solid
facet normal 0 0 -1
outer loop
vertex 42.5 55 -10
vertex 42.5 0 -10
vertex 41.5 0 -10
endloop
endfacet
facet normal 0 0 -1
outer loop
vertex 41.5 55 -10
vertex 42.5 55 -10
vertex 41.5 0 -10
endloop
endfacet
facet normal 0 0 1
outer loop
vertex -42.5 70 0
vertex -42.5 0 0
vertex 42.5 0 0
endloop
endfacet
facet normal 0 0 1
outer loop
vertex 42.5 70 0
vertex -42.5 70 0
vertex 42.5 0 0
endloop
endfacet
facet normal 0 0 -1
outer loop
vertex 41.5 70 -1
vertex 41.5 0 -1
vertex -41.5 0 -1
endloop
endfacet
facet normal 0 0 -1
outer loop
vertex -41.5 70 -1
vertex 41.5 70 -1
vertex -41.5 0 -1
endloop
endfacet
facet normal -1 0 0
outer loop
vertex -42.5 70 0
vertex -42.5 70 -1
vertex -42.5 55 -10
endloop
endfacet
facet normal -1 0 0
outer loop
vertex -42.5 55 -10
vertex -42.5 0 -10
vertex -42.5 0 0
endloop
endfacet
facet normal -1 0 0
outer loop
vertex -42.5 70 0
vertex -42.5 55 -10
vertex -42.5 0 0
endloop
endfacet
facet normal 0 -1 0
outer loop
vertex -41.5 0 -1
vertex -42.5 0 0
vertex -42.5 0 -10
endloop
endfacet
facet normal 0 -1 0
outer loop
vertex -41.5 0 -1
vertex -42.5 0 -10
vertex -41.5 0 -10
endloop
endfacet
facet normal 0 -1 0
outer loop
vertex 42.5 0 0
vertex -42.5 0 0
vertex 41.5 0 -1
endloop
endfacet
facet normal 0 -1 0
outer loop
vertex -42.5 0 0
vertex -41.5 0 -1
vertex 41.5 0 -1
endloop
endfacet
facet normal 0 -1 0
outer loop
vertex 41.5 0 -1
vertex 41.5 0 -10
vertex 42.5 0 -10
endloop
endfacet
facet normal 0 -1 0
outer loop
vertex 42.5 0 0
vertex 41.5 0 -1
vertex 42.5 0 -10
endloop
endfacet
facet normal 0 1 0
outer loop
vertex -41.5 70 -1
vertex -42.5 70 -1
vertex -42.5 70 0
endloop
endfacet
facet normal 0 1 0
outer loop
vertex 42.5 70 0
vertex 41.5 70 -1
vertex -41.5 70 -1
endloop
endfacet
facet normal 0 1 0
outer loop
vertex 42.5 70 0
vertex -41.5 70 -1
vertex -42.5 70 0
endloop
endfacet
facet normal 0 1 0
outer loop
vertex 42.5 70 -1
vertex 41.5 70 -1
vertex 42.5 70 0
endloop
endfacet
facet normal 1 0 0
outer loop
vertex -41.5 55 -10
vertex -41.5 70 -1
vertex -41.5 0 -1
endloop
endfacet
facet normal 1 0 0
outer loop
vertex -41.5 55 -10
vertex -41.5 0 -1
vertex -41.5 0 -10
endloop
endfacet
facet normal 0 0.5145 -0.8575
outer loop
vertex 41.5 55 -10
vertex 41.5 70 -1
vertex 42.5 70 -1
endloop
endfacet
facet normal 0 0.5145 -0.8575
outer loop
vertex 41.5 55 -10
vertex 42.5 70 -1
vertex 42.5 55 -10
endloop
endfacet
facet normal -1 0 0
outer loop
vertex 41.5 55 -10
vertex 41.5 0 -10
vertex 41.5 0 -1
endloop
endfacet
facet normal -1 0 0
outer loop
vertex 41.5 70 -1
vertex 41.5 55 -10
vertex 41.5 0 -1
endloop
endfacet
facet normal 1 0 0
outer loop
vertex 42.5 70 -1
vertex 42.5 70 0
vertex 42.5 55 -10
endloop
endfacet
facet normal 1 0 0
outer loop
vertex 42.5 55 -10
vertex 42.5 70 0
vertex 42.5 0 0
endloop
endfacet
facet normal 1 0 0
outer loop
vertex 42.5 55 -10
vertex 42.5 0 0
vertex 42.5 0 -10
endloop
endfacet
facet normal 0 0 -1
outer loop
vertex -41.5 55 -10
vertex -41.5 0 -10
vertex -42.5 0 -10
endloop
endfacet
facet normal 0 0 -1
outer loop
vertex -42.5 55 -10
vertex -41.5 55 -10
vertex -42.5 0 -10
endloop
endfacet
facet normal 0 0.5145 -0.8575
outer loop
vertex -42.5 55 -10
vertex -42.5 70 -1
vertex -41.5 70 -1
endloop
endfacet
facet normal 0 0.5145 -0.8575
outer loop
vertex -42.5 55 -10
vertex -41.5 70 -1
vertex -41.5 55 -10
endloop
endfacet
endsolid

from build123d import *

# Parameters (mm, degrees)
BOSS_EXTRUDE1_DEPTH     = 70
CUT_EXTRUDE2_DEPTH      = 83.5
CUT_EXTRUDE2_DEPTH_BACK = 83.5


with BuildPart() as part:
    # Sketch1 → Boss-Extrude1 (new body)
    with BuildSketch(Plane(origin=(0, 0, 0), x_dir=(1, 0, 0), z_dir=(0, 1, 0))):
        Polygon((-42.5, 0), (42.5, 0), (42.5, 10), (41.5, 10), (41.5, 1), (-41.5, 1), (-41.5, 10), (-42.5, 10), align=None)
    extrude(amount=BOSS_EXTRUDE1_DEPTH)

    # Sketch2 → Cut-Extrude2 (cut, two sides: drawn at the far end of the back side and taken through both)
    with BuildSketch(Plane(origin=(0, 0, 0), x_dir=(0, 0, -1), z_dir=(1, 0, 0)).offset(-CUT_EXTRUDE2_DEPTH_BACK)):
        Polygon((1, 70), (10, 55), (10, 70), align=None)
    extrude(amount=CUT_EXTRUDE2_DEPTH + CUT_EXTRUDE2_DEPTH_BACK, mode=Mode.SUBTRACT)


solid = part.part
